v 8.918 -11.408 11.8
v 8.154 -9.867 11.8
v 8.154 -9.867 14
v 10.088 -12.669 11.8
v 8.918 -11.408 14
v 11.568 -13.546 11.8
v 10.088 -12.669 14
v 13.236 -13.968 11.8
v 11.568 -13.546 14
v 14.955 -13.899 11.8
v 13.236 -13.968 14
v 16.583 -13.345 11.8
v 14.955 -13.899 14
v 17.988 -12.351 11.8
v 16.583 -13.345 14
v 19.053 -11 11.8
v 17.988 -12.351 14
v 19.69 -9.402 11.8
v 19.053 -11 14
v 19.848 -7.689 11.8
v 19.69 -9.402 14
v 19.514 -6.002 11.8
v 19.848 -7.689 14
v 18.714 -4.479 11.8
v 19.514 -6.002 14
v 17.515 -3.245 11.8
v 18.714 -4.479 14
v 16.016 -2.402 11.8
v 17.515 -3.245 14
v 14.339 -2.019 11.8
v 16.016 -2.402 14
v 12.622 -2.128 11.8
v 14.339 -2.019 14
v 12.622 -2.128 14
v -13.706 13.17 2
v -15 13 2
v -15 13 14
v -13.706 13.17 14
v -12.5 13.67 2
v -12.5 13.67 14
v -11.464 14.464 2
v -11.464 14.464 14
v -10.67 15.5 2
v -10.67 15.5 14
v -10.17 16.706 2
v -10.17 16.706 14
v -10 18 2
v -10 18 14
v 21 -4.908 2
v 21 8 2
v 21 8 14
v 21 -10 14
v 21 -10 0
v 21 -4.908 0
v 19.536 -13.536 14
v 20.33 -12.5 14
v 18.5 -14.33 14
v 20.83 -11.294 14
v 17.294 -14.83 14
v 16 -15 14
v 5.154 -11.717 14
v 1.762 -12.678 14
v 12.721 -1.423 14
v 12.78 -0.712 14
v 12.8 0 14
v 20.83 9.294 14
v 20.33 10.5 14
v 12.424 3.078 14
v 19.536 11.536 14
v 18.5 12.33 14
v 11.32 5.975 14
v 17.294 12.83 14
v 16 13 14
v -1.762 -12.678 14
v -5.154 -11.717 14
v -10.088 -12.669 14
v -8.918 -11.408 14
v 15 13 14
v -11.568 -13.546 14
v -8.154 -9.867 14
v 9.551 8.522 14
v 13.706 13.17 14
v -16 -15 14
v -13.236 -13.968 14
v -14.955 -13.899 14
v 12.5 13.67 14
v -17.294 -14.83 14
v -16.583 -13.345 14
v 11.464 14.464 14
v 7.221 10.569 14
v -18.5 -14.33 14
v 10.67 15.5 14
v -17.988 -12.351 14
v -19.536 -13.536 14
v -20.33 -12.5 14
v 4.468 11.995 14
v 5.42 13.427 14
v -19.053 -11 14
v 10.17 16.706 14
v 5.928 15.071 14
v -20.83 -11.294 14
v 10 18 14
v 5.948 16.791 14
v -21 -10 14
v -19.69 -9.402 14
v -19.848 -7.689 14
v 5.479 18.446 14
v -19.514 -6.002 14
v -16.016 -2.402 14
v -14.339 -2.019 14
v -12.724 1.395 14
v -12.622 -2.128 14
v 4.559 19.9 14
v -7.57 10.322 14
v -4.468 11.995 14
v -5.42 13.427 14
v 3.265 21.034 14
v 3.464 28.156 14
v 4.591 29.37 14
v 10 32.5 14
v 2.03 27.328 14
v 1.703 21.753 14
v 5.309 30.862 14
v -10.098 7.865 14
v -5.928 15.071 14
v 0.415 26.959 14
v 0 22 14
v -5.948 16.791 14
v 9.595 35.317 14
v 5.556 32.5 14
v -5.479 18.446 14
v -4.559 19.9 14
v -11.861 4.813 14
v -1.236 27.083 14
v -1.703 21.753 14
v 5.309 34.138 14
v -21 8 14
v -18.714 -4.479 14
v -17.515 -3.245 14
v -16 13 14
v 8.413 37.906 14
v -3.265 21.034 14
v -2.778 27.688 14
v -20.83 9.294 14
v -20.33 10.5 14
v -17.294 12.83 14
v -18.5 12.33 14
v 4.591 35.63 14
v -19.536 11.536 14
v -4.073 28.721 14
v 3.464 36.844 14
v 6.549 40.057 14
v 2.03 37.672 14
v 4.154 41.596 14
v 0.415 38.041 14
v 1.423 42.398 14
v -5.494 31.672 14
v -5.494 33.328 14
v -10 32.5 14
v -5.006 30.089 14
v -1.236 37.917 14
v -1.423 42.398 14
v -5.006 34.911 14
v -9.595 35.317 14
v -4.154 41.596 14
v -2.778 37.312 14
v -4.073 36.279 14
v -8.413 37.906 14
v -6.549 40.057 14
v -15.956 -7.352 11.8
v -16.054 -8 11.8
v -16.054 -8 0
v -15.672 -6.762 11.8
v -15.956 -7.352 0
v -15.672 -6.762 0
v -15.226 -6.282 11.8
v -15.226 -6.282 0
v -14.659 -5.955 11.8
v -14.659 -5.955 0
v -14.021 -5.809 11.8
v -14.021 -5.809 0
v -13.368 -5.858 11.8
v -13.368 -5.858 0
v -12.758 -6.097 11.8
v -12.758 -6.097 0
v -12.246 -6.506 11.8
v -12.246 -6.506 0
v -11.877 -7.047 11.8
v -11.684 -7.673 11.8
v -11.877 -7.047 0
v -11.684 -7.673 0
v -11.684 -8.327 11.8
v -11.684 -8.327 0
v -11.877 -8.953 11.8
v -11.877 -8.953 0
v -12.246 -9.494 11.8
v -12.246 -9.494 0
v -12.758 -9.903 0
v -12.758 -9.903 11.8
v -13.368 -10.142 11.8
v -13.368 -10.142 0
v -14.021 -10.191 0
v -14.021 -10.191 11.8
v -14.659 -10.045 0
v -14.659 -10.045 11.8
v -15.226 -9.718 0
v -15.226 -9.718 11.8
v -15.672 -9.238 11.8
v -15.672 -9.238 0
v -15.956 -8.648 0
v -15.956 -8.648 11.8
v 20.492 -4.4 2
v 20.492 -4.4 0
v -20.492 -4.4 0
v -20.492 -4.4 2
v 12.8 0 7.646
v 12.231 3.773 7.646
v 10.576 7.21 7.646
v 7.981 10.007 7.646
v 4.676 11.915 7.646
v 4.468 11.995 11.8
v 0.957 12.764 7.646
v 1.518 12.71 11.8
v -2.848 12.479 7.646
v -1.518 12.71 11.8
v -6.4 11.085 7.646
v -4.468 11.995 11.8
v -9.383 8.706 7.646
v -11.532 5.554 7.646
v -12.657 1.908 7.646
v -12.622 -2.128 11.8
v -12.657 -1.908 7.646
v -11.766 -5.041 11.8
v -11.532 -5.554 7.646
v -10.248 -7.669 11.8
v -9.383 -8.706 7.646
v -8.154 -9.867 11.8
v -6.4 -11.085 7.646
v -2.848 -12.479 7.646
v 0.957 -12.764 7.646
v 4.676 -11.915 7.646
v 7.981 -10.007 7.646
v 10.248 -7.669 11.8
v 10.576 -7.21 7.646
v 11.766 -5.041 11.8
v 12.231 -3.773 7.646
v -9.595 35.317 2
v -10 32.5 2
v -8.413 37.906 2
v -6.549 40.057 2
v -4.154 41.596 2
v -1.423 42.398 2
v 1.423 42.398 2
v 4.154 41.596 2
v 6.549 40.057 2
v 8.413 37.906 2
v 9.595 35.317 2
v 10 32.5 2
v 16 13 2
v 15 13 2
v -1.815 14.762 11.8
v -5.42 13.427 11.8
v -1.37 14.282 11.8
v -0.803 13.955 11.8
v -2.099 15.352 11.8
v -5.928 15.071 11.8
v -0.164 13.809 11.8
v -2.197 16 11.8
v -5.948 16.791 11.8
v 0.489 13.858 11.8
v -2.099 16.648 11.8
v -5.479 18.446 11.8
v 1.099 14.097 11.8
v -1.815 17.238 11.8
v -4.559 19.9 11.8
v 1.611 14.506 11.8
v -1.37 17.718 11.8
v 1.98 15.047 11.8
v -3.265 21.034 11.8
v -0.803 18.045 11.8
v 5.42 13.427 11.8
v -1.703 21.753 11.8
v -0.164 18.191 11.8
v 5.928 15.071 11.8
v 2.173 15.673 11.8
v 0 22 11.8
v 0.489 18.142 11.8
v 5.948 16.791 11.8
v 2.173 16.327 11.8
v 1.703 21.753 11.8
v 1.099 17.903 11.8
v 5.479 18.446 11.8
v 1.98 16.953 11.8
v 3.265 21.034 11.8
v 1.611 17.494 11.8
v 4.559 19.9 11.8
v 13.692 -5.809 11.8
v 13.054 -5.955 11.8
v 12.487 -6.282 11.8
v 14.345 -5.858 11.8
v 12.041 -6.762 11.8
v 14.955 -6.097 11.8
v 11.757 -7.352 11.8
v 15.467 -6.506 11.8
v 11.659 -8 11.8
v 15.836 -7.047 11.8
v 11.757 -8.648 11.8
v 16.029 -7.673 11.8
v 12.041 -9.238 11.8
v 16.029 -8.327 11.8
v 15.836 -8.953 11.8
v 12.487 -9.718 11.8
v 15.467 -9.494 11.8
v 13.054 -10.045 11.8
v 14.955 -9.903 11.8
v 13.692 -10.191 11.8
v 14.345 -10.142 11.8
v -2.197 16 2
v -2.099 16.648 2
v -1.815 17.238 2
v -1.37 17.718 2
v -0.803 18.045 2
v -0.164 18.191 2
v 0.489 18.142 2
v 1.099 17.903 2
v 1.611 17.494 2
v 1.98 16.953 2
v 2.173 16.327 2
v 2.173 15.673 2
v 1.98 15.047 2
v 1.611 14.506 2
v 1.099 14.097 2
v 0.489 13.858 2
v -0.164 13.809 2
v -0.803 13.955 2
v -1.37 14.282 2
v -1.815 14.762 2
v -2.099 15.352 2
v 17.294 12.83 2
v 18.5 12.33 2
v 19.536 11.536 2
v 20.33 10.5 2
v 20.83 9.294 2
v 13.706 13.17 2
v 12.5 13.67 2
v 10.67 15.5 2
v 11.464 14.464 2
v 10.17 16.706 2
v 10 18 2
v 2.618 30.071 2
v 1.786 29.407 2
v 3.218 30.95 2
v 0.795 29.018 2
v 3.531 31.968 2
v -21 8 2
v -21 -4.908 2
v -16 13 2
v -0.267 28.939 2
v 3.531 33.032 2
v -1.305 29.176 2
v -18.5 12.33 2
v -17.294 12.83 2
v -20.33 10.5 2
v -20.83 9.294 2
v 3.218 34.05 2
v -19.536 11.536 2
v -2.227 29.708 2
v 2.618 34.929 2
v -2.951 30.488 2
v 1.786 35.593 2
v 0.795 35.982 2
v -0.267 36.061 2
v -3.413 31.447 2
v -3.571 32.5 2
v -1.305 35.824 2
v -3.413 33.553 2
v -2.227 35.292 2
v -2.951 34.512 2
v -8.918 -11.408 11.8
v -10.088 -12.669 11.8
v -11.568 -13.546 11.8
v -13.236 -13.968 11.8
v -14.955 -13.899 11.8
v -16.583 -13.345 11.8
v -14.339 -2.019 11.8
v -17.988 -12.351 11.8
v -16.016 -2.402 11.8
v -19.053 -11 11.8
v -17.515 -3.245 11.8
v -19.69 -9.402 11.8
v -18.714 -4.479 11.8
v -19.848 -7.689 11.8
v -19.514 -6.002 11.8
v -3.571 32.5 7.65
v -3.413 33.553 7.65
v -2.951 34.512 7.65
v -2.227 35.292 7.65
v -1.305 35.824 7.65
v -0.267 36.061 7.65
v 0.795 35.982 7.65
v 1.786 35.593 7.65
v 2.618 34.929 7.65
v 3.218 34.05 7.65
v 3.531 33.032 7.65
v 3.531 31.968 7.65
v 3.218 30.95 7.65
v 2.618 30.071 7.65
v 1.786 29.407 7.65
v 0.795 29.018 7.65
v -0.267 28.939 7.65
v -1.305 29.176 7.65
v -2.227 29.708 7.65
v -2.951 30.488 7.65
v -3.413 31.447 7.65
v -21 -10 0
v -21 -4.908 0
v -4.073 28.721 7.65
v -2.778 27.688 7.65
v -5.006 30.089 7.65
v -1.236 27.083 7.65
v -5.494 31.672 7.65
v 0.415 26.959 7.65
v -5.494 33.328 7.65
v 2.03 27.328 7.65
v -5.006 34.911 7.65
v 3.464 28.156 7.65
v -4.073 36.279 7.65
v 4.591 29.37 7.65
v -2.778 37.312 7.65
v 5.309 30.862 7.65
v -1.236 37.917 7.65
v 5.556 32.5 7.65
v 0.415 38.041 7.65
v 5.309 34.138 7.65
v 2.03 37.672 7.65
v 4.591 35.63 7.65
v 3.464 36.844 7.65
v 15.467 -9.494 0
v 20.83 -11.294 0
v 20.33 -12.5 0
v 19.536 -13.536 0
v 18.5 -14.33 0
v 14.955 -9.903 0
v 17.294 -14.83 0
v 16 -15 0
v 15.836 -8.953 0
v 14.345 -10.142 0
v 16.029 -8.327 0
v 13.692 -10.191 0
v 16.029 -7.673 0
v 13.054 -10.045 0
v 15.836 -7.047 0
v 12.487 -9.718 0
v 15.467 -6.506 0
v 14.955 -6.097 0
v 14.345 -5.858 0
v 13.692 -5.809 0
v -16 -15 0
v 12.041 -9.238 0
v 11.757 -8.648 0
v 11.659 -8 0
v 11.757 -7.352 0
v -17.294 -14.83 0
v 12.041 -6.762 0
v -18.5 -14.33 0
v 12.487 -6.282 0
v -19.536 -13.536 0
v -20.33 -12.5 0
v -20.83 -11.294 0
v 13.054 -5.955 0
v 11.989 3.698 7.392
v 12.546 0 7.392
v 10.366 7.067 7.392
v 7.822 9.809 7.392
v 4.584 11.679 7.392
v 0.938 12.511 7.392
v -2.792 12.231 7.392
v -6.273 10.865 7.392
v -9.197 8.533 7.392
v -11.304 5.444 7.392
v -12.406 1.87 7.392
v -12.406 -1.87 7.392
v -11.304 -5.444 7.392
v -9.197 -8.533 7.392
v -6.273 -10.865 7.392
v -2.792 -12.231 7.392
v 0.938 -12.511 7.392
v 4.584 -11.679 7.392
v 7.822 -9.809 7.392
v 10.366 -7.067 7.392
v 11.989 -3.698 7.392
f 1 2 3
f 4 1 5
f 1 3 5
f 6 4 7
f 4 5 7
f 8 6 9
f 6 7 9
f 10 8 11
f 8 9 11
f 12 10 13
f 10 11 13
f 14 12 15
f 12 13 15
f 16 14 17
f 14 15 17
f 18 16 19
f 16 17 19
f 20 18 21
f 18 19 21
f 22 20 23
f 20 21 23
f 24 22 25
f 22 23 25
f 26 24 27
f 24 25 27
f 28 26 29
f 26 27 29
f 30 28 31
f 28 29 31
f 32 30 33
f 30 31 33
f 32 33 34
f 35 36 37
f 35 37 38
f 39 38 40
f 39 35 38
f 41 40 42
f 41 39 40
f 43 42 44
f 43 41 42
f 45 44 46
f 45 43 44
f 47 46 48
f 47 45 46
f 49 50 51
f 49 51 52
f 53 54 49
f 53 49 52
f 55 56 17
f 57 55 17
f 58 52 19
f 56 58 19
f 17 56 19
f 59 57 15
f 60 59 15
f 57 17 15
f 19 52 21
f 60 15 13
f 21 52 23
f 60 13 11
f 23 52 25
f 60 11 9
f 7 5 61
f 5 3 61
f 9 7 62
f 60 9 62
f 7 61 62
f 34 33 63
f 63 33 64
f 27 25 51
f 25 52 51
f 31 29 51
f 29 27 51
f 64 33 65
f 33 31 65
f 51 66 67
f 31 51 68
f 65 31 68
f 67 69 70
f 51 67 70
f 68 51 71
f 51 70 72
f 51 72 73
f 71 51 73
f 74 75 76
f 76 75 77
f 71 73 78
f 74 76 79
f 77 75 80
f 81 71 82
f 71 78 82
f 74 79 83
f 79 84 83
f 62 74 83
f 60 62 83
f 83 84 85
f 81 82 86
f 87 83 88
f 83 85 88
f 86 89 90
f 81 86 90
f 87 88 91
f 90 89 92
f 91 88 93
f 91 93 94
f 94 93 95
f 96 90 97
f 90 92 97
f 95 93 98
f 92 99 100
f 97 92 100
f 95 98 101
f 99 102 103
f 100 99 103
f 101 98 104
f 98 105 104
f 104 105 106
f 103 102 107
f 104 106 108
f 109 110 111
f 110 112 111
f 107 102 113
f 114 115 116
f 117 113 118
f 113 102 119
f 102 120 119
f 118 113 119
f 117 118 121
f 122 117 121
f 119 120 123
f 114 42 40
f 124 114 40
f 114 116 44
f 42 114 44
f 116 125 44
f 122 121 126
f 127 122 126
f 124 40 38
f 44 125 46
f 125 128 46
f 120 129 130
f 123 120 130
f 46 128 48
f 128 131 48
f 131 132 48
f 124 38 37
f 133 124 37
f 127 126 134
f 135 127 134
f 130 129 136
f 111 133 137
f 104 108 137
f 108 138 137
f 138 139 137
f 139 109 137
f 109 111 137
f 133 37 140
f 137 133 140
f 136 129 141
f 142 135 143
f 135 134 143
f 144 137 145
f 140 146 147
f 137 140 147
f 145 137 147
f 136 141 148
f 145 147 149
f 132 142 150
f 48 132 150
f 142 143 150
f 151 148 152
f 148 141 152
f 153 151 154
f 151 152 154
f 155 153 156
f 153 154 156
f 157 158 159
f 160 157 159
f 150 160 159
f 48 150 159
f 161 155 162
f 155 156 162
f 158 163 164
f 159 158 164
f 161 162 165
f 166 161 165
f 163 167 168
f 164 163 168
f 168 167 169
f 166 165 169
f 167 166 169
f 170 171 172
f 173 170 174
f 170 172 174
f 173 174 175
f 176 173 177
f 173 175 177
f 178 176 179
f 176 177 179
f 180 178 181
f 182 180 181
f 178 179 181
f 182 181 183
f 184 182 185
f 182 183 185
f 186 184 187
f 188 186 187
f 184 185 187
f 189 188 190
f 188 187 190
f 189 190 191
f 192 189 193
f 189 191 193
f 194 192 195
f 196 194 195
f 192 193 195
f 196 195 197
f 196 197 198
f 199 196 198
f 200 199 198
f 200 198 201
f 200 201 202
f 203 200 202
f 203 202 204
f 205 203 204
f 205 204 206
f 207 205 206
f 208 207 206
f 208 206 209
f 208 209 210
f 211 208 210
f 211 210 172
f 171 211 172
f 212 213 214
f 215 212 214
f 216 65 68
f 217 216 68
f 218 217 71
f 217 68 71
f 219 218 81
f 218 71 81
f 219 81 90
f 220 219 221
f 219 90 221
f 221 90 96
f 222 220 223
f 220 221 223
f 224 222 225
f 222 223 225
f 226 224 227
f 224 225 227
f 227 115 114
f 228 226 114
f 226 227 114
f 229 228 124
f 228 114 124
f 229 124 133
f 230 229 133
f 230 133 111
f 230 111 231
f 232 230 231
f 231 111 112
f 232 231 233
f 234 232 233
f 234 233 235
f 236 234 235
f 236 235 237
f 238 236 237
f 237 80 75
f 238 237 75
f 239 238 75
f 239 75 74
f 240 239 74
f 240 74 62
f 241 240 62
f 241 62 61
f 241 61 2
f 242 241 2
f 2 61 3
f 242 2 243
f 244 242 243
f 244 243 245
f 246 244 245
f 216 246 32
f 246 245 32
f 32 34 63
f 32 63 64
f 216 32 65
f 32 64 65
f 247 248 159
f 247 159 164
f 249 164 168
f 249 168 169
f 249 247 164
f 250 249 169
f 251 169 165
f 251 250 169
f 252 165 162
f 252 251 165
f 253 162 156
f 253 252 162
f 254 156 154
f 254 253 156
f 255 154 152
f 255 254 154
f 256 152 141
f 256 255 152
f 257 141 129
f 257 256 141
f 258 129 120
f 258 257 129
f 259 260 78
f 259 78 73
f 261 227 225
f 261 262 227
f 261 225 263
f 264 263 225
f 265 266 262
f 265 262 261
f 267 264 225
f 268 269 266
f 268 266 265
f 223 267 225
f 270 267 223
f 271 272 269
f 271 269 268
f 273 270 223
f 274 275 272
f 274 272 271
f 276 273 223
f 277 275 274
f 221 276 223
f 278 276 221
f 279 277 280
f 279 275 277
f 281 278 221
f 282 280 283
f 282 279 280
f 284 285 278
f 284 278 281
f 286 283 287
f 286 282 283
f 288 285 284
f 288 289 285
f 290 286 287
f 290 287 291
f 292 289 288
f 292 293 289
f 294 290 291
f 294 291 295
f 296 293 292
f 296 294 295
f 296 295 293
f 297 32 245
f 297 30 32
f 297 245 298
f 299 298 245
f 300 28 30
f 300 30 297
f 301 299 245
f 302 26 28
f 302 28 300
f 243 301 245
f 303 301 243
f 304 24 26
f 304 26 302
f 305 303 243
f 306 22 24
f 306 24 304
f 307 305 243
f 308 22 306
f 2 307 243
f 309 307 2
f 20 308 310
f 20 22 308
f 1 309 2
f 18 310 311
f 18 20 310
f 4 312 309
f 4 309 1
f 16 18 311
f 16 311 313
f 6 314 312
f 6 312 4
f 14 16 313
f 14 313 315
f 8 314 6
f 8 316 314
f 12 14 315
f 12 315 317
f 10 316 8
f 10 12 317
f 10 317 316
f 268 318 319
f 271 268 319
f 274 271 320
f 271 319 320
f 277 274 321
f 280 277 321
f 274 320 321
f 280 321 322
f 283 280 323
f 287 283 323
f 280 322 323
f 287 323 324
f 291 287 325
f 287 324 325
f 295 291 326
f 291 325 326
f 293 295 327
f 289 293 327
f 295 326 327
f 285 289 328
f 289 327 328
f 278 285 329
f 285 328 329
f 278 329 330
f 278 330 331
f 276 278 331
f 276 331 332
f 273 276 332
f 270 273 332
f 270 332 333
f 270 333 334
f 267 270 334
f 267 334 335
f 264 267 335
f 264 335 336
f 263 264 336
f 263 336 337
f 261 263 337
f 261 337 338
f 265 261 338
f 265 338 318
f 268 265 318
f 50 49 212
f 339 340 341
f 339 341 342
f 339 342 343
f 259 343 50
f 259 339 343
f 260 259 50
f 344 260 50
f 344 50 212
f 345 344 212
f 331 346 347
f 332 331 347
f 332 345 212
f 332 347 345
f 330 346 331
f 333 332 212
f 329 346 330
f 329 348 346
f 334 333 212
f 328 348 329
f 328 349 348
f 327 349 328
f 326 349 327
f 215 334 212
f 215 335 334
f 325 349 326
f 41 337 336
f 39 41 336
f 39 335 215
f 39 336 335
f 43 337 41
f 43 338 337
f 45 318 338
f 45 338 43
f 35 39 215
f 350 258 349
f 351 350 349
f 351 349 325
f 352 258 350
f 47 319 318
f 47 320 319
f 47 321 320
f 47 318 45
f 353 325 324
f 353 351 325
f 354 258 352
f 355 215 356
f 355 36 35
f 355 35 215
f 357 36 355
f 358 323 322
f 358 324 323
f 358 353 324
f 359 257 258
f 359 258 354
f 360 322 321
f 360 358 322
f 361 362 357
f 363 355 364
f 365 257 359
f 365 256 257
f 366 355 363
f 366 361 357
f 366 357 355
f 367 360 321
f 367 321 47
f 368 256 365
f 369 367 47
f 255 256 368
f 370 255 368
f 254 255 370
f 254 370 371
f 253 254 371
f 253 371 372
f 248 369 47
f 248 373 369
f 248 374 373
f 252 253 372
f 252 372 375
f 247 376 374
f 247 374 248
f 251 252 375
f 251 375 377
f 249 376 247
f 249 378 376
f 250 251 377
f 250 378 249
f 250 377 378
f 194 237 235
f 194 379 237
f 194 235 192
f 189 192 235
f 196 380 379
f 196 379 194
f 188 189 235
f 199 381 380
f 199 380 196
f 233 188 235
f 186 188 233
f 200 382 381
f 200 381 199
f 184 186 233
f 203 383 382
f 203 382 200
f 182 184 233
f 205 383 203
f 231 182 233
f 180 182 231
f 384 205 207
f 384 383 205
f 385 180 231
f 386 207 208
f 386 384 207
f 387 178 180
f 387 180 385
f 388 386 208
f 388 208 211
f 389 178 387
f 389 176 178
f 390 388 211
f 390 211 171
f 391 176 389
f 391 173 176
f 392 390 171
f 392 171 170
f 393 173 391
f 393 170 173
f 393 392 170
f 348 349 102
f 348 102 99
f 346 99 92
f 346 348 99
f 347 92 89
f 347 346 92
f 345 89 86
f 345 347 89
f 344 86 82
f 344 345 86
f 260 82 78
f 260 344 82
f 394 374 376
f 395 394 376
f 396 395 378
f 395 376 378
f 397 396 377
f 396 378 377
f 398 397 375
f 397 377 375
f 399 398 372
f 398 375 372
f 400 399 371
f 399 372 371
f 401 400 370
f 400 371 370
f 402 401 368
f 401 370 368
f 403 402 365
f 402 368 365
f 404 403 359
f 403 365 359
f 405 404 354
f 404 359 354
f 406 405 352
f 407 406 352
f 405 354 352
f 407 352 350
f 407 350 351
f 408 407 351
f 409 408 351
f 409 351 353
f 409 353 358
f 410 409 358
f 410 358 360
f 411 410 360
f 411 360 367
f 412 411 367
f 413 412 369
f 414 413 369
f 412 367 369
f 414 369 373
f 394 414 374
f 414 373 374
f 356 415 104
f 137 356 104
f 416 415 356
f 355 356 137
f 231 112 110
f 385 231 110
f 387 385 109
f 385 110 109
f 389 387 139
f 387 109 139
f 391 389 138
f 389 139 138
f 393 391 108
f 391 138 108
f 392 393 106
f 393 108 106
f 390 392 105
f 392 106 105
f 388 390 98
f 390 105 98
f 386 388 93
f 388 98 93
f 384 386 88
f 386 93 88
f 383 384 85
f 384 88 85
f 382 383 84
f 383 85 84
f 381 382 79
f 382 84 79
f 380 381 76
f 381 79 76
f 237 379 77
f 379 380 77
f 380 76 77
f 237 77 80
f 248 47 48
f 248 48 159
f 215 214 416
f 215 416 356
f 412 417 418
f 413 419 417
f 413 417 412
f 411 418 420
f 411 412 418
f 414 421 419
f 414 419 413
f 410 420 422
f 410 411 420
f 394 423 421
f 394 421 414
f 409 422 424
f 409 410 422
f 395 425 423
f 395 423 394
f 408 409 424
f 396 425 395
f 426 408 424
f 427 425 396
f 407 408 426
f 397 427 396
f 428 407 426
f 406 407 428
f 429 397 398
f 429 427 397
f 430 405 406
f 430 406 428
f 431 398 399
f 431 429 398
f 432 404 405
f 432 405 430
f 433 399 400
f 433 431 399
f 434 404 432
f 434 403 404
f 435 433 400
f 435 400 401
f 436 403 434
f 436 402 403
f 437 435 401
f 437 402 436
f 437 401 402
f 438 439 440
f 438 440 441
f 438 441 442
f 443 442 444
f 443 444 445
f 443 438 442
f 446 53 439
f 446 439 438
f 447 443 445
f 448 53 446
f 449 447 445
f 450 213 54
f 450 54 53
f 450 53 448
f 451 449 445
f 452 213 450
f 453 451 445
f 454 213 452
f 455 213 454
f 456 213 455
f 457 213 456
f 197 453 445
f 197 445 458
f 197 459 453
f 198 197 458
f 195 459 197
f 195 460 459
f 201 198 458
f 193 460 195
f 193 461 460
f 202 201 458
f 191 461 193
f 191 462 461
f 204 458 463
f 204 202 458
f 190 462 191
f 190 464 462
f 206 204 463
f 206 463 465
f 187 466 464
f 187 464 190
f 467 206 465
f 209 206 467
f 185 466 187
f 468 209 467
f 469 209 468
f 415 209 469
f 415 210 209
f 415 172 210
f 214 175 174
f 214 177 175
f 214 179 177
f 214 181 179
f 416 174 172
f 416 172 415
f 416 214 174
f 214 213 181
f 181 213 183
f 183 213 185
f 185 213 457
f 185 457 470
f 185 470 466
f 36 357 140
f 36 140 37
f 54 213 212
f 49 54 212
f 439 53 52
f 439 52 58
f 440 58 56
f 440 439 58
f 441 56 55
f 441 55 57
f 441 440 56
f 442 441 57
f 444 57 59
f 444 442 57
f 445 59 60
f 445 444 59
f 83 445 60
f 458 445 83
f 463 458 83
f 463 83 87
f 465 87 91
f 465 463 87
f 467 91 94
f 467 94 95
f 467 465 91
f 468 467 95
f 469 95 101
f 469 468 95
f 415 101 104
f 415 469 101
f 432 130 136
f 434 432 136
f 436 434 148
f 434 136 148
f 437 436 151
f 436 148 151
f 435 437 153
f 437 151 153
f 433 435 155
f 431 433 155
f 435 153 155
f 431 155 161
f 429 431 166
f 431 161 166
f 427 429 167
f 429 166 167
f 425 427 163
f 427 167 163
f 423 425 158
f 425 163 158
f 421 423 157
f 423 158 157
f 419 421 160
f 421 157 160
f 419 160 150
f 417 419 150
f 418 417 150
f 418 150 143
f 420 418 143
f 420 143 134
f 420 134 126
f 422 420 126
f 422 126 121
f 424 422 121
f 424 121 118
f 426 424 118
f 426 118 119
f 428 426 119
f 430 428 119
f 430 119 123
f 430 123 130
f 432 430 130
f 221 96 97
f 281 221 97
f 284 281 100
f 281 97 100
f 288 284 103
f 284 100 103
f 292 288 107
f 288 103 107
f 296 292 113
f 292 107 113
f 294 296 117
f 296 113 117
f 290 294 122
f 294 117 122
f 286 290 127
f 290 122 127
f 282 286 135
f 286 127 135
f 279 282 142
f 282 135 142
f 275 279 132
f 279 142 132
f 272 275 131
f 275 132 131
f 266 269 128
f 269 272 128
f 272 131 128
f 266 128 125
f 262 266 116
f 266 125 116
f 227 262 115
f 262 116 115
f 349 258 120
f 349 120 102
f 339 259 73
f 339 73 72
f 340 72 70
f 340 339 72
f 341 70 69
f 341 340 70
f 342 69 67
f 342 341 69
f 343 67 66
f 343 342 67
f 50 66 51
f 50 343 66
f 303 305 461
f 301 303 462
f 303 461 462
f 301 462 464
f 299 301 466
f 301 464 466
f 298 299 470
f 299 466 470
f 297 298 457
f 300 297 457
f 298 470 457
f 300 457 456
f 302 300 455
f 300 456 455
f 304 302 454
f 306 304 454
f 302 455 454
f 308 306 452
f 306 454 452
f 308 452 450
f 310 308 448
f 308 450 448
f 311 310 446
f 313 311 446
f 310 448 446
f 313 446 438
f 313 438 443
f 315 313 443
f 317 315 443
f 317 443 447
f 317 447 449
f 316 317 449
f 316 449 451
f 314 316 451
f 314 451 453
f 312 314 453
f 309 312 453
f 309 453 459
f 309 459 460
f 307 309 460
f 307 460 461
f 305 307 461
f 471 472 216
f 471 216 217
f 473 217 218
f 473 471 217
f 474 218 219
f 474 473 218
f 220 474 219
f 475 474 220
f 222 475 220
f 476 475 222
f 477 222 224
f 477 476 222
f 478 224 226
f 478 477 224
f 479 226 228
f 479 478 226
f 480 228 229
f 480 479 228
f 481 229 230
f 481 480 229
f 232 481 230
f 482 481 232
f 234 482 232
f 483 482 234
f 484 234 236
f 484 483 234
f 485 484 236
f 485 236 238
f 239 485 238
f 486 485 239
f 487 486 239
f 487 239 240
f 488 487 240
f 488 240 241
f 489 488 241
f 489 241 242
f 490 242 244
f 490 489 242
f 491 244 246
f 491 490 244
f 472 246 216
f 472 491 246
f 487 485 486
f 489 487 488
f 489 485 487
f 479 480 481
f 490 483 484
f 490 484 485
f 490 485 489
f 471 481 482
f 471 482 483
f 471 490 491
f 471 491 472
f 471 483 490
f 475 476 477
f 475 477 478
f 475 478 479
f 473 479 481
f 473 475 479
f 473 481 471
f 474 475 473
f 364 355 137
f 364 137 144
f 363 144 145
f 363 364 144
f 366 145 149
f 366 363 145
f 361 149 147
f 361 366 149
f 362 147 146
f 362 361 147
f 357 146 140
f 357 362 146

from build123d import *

# Parameters (mm, degrees)
BOSS_EXTRUDE1_DEPTH                              = 14
SKETCH2_R                                        = 12.8
CUT_EXTRUDE1_DEPTH                               = 6.608
CBORE_FOR_1_4_SOCKET_HEAD_CAP_SCREW1_D           = 7.14248
CBORE_FOR_1_4_SOCKET_HEAD_CAP_SCREW1_CBORE_D     = 11.1125
CBORE_FOR_1_4_SOCKET_HEAD_CAP_SCREW1_CBORE_DEPTH = 6.35
SKETCH5_R                                        = 6
CUT_EXTRUDE2_DEPTH                               = 2.2
CIRPATTERN2_COUNT                                = 3
TAPPED_HOLE_FOR_8_32_HELICOIL1_D                 = 4.3942
TAPPED_HOLE_FOR_8_32_HELICOIL1_DEPTH             = 13.322
TAPPED_HOLE_FOR_8_32_HELICOIL1_TIP               = 1.320150866
SKETCH8_W                                        = 42
SKETCH8_H                                        = 46.9
CUT_EXTRUDE3_DEPTH                               = 2
CHAMFER1_SIZE                                    = 0.508
CHAMFER2_SIZE                                    = 0.254


with BuildPart() as part:
    # Sketch1 → Boss-Extrude1 (new body)
    with BuildSketch(Plane.XY):
        with BuildLine():
            Line((-10, 18), (-10, 32.5))
            ThreePointArc((-10, 32.5), (0, 42.5), (10, 32.5))
            Line((10, 32.5), (10, 18))
            ThreePointArc((10, 18), (11.464466094, 14.464466094), (15, 13))
            Line((15, 13), (16, 13))
            ThreePointArc((16, 13), (19.535533906, 11.535533906), (21, 8))
            Line((21, 8), (21, -10))
            ThreePointArc((21, -10), (19.535533906, -13.535533906), (16, -15))
            Line((16, -15), (-16, -15))
            ThreePointArc((-16, -15), (-19.535533906, -13.535533906), (-21, -10))
            Line((-21, -10), (-21, 8))
            ThreePointArc((-21, 8), (-19.535533906, 11.535533906), (-16, 13))
            Line((-16, 13), (-15, 13))
            ThreePointArc((-15, 13), (-11.464466094, 14.464466094), (-10, 18))
        make_face()
    extrude(amount=BOSS_EXTRUDE1_DEPTH)

    # Sketch2 → Cut-Extrude1 (cut)
    with BuildSketch(Plane.XY.offset(14)):
        Circle(SKETCH2_R)
    extrude(amount=-CUT_EXTRUDE1_DEPTH, mode=Mode.SUBTRACT)

    # CBORE for 1_4 Socket Head Cap Screw1 (through all)
    with Locations(Plane.XY.offset(14)):
        with Locations((0, 32.5)):
            CounterBoreHole(CBORE_FOR_1_4_SOCKET_HEAD_CAP_SCREW1_D / 2, CBORE_FOR_1_4_SOCKET_HEAD_CAP_SCREW1_CBORE_D / 2, CBORE_FOR_1_4_SOCKET_HEAD_CAP_SCREW1_CBORE_DEPTH)

    # Sketch5 → Cut-Extrude2 (cut)
    with BuildSketch(Plane.XY.offset(14)):
        with Locations((0, 16)):
            Circle(SKETCH5_R)
    cut_extrude2 = extrude(amount=-CUT_EXTRUDE2_DEPTH, mode=Mode.SUBTRACT)

    # CirPattern2: Cut-Extrude2 ×3 about axis
    cirpattern2_axis = Axis((0, 0, 0), (0, 0, 1))
    for i in range(1, CIRPATTERN2_COUNT):
        add(cut_extrude2.rotate(cirpattern2_axis, i * 360 / CIRPATTERN2_COUNT), mode=Mode.SUBTRACT)

    # Tapped Hole for _8-32 Helicoil1
    with Locations(Plane.XY.offset(11.8)):
        with Locations((0, 16), (-13.856406461, -8), (13.856406461, -8)):
            Hole(TAPPED_HOLE_FOR_8_32_HELICOIL1_D / 2, depth=TAPPED_HOLE_FOR_8_32_HELICOIL1_DEPTH)
            with Locations((0, 0, -(TAPPED_HOLE_FOR_8_32_HELICOIL1_DEPTH + TAPPED_HOLE_FOR_8_32_HELICOIL1_TIP / 2))):  # 118° drill point
                Cone(0, TAPPED_HOLE_FOR_8_32_HELICOIL1_D / 2, TAPPED_HOLE_FOR_8_32_HELICOIL1_TIP, mode=Mode.SUBTRACT)

    # Sketch8 → Cut-Extrude3 (cut)
    with BuildSketch(Plane(origin=(0, 0, 0), x_dir=(-1, 0, 0), z_dir=(0, 0, -1))):
        with Locations((0, 19.05)):
            Rectangle(SKETCH8_W, SKETCH8_H)
    extrude(amount=-CUT_EXTRUDE3_DEPTH, mode=Mode.SUBTRACT)

    # Chamfer1
    chamfer1_edges = [part.edges().sort_by_distance(p)[0] for p in [
        (21, -4.4, 1),
        (-21, -4.4, 1),
    ]]
    chamfer(chamfer1_edges, length=CHAMFER1_SIZE)

    # Chamfer2
    chamfer2_edges = [part.edges().sort_by_distance(p)[0] for p in [
        (-12.8, 0, 7.392),
    ]]
    chamfer(chamfer2_edges, length=CHAMFER2_SIZE)


solid = part.part
